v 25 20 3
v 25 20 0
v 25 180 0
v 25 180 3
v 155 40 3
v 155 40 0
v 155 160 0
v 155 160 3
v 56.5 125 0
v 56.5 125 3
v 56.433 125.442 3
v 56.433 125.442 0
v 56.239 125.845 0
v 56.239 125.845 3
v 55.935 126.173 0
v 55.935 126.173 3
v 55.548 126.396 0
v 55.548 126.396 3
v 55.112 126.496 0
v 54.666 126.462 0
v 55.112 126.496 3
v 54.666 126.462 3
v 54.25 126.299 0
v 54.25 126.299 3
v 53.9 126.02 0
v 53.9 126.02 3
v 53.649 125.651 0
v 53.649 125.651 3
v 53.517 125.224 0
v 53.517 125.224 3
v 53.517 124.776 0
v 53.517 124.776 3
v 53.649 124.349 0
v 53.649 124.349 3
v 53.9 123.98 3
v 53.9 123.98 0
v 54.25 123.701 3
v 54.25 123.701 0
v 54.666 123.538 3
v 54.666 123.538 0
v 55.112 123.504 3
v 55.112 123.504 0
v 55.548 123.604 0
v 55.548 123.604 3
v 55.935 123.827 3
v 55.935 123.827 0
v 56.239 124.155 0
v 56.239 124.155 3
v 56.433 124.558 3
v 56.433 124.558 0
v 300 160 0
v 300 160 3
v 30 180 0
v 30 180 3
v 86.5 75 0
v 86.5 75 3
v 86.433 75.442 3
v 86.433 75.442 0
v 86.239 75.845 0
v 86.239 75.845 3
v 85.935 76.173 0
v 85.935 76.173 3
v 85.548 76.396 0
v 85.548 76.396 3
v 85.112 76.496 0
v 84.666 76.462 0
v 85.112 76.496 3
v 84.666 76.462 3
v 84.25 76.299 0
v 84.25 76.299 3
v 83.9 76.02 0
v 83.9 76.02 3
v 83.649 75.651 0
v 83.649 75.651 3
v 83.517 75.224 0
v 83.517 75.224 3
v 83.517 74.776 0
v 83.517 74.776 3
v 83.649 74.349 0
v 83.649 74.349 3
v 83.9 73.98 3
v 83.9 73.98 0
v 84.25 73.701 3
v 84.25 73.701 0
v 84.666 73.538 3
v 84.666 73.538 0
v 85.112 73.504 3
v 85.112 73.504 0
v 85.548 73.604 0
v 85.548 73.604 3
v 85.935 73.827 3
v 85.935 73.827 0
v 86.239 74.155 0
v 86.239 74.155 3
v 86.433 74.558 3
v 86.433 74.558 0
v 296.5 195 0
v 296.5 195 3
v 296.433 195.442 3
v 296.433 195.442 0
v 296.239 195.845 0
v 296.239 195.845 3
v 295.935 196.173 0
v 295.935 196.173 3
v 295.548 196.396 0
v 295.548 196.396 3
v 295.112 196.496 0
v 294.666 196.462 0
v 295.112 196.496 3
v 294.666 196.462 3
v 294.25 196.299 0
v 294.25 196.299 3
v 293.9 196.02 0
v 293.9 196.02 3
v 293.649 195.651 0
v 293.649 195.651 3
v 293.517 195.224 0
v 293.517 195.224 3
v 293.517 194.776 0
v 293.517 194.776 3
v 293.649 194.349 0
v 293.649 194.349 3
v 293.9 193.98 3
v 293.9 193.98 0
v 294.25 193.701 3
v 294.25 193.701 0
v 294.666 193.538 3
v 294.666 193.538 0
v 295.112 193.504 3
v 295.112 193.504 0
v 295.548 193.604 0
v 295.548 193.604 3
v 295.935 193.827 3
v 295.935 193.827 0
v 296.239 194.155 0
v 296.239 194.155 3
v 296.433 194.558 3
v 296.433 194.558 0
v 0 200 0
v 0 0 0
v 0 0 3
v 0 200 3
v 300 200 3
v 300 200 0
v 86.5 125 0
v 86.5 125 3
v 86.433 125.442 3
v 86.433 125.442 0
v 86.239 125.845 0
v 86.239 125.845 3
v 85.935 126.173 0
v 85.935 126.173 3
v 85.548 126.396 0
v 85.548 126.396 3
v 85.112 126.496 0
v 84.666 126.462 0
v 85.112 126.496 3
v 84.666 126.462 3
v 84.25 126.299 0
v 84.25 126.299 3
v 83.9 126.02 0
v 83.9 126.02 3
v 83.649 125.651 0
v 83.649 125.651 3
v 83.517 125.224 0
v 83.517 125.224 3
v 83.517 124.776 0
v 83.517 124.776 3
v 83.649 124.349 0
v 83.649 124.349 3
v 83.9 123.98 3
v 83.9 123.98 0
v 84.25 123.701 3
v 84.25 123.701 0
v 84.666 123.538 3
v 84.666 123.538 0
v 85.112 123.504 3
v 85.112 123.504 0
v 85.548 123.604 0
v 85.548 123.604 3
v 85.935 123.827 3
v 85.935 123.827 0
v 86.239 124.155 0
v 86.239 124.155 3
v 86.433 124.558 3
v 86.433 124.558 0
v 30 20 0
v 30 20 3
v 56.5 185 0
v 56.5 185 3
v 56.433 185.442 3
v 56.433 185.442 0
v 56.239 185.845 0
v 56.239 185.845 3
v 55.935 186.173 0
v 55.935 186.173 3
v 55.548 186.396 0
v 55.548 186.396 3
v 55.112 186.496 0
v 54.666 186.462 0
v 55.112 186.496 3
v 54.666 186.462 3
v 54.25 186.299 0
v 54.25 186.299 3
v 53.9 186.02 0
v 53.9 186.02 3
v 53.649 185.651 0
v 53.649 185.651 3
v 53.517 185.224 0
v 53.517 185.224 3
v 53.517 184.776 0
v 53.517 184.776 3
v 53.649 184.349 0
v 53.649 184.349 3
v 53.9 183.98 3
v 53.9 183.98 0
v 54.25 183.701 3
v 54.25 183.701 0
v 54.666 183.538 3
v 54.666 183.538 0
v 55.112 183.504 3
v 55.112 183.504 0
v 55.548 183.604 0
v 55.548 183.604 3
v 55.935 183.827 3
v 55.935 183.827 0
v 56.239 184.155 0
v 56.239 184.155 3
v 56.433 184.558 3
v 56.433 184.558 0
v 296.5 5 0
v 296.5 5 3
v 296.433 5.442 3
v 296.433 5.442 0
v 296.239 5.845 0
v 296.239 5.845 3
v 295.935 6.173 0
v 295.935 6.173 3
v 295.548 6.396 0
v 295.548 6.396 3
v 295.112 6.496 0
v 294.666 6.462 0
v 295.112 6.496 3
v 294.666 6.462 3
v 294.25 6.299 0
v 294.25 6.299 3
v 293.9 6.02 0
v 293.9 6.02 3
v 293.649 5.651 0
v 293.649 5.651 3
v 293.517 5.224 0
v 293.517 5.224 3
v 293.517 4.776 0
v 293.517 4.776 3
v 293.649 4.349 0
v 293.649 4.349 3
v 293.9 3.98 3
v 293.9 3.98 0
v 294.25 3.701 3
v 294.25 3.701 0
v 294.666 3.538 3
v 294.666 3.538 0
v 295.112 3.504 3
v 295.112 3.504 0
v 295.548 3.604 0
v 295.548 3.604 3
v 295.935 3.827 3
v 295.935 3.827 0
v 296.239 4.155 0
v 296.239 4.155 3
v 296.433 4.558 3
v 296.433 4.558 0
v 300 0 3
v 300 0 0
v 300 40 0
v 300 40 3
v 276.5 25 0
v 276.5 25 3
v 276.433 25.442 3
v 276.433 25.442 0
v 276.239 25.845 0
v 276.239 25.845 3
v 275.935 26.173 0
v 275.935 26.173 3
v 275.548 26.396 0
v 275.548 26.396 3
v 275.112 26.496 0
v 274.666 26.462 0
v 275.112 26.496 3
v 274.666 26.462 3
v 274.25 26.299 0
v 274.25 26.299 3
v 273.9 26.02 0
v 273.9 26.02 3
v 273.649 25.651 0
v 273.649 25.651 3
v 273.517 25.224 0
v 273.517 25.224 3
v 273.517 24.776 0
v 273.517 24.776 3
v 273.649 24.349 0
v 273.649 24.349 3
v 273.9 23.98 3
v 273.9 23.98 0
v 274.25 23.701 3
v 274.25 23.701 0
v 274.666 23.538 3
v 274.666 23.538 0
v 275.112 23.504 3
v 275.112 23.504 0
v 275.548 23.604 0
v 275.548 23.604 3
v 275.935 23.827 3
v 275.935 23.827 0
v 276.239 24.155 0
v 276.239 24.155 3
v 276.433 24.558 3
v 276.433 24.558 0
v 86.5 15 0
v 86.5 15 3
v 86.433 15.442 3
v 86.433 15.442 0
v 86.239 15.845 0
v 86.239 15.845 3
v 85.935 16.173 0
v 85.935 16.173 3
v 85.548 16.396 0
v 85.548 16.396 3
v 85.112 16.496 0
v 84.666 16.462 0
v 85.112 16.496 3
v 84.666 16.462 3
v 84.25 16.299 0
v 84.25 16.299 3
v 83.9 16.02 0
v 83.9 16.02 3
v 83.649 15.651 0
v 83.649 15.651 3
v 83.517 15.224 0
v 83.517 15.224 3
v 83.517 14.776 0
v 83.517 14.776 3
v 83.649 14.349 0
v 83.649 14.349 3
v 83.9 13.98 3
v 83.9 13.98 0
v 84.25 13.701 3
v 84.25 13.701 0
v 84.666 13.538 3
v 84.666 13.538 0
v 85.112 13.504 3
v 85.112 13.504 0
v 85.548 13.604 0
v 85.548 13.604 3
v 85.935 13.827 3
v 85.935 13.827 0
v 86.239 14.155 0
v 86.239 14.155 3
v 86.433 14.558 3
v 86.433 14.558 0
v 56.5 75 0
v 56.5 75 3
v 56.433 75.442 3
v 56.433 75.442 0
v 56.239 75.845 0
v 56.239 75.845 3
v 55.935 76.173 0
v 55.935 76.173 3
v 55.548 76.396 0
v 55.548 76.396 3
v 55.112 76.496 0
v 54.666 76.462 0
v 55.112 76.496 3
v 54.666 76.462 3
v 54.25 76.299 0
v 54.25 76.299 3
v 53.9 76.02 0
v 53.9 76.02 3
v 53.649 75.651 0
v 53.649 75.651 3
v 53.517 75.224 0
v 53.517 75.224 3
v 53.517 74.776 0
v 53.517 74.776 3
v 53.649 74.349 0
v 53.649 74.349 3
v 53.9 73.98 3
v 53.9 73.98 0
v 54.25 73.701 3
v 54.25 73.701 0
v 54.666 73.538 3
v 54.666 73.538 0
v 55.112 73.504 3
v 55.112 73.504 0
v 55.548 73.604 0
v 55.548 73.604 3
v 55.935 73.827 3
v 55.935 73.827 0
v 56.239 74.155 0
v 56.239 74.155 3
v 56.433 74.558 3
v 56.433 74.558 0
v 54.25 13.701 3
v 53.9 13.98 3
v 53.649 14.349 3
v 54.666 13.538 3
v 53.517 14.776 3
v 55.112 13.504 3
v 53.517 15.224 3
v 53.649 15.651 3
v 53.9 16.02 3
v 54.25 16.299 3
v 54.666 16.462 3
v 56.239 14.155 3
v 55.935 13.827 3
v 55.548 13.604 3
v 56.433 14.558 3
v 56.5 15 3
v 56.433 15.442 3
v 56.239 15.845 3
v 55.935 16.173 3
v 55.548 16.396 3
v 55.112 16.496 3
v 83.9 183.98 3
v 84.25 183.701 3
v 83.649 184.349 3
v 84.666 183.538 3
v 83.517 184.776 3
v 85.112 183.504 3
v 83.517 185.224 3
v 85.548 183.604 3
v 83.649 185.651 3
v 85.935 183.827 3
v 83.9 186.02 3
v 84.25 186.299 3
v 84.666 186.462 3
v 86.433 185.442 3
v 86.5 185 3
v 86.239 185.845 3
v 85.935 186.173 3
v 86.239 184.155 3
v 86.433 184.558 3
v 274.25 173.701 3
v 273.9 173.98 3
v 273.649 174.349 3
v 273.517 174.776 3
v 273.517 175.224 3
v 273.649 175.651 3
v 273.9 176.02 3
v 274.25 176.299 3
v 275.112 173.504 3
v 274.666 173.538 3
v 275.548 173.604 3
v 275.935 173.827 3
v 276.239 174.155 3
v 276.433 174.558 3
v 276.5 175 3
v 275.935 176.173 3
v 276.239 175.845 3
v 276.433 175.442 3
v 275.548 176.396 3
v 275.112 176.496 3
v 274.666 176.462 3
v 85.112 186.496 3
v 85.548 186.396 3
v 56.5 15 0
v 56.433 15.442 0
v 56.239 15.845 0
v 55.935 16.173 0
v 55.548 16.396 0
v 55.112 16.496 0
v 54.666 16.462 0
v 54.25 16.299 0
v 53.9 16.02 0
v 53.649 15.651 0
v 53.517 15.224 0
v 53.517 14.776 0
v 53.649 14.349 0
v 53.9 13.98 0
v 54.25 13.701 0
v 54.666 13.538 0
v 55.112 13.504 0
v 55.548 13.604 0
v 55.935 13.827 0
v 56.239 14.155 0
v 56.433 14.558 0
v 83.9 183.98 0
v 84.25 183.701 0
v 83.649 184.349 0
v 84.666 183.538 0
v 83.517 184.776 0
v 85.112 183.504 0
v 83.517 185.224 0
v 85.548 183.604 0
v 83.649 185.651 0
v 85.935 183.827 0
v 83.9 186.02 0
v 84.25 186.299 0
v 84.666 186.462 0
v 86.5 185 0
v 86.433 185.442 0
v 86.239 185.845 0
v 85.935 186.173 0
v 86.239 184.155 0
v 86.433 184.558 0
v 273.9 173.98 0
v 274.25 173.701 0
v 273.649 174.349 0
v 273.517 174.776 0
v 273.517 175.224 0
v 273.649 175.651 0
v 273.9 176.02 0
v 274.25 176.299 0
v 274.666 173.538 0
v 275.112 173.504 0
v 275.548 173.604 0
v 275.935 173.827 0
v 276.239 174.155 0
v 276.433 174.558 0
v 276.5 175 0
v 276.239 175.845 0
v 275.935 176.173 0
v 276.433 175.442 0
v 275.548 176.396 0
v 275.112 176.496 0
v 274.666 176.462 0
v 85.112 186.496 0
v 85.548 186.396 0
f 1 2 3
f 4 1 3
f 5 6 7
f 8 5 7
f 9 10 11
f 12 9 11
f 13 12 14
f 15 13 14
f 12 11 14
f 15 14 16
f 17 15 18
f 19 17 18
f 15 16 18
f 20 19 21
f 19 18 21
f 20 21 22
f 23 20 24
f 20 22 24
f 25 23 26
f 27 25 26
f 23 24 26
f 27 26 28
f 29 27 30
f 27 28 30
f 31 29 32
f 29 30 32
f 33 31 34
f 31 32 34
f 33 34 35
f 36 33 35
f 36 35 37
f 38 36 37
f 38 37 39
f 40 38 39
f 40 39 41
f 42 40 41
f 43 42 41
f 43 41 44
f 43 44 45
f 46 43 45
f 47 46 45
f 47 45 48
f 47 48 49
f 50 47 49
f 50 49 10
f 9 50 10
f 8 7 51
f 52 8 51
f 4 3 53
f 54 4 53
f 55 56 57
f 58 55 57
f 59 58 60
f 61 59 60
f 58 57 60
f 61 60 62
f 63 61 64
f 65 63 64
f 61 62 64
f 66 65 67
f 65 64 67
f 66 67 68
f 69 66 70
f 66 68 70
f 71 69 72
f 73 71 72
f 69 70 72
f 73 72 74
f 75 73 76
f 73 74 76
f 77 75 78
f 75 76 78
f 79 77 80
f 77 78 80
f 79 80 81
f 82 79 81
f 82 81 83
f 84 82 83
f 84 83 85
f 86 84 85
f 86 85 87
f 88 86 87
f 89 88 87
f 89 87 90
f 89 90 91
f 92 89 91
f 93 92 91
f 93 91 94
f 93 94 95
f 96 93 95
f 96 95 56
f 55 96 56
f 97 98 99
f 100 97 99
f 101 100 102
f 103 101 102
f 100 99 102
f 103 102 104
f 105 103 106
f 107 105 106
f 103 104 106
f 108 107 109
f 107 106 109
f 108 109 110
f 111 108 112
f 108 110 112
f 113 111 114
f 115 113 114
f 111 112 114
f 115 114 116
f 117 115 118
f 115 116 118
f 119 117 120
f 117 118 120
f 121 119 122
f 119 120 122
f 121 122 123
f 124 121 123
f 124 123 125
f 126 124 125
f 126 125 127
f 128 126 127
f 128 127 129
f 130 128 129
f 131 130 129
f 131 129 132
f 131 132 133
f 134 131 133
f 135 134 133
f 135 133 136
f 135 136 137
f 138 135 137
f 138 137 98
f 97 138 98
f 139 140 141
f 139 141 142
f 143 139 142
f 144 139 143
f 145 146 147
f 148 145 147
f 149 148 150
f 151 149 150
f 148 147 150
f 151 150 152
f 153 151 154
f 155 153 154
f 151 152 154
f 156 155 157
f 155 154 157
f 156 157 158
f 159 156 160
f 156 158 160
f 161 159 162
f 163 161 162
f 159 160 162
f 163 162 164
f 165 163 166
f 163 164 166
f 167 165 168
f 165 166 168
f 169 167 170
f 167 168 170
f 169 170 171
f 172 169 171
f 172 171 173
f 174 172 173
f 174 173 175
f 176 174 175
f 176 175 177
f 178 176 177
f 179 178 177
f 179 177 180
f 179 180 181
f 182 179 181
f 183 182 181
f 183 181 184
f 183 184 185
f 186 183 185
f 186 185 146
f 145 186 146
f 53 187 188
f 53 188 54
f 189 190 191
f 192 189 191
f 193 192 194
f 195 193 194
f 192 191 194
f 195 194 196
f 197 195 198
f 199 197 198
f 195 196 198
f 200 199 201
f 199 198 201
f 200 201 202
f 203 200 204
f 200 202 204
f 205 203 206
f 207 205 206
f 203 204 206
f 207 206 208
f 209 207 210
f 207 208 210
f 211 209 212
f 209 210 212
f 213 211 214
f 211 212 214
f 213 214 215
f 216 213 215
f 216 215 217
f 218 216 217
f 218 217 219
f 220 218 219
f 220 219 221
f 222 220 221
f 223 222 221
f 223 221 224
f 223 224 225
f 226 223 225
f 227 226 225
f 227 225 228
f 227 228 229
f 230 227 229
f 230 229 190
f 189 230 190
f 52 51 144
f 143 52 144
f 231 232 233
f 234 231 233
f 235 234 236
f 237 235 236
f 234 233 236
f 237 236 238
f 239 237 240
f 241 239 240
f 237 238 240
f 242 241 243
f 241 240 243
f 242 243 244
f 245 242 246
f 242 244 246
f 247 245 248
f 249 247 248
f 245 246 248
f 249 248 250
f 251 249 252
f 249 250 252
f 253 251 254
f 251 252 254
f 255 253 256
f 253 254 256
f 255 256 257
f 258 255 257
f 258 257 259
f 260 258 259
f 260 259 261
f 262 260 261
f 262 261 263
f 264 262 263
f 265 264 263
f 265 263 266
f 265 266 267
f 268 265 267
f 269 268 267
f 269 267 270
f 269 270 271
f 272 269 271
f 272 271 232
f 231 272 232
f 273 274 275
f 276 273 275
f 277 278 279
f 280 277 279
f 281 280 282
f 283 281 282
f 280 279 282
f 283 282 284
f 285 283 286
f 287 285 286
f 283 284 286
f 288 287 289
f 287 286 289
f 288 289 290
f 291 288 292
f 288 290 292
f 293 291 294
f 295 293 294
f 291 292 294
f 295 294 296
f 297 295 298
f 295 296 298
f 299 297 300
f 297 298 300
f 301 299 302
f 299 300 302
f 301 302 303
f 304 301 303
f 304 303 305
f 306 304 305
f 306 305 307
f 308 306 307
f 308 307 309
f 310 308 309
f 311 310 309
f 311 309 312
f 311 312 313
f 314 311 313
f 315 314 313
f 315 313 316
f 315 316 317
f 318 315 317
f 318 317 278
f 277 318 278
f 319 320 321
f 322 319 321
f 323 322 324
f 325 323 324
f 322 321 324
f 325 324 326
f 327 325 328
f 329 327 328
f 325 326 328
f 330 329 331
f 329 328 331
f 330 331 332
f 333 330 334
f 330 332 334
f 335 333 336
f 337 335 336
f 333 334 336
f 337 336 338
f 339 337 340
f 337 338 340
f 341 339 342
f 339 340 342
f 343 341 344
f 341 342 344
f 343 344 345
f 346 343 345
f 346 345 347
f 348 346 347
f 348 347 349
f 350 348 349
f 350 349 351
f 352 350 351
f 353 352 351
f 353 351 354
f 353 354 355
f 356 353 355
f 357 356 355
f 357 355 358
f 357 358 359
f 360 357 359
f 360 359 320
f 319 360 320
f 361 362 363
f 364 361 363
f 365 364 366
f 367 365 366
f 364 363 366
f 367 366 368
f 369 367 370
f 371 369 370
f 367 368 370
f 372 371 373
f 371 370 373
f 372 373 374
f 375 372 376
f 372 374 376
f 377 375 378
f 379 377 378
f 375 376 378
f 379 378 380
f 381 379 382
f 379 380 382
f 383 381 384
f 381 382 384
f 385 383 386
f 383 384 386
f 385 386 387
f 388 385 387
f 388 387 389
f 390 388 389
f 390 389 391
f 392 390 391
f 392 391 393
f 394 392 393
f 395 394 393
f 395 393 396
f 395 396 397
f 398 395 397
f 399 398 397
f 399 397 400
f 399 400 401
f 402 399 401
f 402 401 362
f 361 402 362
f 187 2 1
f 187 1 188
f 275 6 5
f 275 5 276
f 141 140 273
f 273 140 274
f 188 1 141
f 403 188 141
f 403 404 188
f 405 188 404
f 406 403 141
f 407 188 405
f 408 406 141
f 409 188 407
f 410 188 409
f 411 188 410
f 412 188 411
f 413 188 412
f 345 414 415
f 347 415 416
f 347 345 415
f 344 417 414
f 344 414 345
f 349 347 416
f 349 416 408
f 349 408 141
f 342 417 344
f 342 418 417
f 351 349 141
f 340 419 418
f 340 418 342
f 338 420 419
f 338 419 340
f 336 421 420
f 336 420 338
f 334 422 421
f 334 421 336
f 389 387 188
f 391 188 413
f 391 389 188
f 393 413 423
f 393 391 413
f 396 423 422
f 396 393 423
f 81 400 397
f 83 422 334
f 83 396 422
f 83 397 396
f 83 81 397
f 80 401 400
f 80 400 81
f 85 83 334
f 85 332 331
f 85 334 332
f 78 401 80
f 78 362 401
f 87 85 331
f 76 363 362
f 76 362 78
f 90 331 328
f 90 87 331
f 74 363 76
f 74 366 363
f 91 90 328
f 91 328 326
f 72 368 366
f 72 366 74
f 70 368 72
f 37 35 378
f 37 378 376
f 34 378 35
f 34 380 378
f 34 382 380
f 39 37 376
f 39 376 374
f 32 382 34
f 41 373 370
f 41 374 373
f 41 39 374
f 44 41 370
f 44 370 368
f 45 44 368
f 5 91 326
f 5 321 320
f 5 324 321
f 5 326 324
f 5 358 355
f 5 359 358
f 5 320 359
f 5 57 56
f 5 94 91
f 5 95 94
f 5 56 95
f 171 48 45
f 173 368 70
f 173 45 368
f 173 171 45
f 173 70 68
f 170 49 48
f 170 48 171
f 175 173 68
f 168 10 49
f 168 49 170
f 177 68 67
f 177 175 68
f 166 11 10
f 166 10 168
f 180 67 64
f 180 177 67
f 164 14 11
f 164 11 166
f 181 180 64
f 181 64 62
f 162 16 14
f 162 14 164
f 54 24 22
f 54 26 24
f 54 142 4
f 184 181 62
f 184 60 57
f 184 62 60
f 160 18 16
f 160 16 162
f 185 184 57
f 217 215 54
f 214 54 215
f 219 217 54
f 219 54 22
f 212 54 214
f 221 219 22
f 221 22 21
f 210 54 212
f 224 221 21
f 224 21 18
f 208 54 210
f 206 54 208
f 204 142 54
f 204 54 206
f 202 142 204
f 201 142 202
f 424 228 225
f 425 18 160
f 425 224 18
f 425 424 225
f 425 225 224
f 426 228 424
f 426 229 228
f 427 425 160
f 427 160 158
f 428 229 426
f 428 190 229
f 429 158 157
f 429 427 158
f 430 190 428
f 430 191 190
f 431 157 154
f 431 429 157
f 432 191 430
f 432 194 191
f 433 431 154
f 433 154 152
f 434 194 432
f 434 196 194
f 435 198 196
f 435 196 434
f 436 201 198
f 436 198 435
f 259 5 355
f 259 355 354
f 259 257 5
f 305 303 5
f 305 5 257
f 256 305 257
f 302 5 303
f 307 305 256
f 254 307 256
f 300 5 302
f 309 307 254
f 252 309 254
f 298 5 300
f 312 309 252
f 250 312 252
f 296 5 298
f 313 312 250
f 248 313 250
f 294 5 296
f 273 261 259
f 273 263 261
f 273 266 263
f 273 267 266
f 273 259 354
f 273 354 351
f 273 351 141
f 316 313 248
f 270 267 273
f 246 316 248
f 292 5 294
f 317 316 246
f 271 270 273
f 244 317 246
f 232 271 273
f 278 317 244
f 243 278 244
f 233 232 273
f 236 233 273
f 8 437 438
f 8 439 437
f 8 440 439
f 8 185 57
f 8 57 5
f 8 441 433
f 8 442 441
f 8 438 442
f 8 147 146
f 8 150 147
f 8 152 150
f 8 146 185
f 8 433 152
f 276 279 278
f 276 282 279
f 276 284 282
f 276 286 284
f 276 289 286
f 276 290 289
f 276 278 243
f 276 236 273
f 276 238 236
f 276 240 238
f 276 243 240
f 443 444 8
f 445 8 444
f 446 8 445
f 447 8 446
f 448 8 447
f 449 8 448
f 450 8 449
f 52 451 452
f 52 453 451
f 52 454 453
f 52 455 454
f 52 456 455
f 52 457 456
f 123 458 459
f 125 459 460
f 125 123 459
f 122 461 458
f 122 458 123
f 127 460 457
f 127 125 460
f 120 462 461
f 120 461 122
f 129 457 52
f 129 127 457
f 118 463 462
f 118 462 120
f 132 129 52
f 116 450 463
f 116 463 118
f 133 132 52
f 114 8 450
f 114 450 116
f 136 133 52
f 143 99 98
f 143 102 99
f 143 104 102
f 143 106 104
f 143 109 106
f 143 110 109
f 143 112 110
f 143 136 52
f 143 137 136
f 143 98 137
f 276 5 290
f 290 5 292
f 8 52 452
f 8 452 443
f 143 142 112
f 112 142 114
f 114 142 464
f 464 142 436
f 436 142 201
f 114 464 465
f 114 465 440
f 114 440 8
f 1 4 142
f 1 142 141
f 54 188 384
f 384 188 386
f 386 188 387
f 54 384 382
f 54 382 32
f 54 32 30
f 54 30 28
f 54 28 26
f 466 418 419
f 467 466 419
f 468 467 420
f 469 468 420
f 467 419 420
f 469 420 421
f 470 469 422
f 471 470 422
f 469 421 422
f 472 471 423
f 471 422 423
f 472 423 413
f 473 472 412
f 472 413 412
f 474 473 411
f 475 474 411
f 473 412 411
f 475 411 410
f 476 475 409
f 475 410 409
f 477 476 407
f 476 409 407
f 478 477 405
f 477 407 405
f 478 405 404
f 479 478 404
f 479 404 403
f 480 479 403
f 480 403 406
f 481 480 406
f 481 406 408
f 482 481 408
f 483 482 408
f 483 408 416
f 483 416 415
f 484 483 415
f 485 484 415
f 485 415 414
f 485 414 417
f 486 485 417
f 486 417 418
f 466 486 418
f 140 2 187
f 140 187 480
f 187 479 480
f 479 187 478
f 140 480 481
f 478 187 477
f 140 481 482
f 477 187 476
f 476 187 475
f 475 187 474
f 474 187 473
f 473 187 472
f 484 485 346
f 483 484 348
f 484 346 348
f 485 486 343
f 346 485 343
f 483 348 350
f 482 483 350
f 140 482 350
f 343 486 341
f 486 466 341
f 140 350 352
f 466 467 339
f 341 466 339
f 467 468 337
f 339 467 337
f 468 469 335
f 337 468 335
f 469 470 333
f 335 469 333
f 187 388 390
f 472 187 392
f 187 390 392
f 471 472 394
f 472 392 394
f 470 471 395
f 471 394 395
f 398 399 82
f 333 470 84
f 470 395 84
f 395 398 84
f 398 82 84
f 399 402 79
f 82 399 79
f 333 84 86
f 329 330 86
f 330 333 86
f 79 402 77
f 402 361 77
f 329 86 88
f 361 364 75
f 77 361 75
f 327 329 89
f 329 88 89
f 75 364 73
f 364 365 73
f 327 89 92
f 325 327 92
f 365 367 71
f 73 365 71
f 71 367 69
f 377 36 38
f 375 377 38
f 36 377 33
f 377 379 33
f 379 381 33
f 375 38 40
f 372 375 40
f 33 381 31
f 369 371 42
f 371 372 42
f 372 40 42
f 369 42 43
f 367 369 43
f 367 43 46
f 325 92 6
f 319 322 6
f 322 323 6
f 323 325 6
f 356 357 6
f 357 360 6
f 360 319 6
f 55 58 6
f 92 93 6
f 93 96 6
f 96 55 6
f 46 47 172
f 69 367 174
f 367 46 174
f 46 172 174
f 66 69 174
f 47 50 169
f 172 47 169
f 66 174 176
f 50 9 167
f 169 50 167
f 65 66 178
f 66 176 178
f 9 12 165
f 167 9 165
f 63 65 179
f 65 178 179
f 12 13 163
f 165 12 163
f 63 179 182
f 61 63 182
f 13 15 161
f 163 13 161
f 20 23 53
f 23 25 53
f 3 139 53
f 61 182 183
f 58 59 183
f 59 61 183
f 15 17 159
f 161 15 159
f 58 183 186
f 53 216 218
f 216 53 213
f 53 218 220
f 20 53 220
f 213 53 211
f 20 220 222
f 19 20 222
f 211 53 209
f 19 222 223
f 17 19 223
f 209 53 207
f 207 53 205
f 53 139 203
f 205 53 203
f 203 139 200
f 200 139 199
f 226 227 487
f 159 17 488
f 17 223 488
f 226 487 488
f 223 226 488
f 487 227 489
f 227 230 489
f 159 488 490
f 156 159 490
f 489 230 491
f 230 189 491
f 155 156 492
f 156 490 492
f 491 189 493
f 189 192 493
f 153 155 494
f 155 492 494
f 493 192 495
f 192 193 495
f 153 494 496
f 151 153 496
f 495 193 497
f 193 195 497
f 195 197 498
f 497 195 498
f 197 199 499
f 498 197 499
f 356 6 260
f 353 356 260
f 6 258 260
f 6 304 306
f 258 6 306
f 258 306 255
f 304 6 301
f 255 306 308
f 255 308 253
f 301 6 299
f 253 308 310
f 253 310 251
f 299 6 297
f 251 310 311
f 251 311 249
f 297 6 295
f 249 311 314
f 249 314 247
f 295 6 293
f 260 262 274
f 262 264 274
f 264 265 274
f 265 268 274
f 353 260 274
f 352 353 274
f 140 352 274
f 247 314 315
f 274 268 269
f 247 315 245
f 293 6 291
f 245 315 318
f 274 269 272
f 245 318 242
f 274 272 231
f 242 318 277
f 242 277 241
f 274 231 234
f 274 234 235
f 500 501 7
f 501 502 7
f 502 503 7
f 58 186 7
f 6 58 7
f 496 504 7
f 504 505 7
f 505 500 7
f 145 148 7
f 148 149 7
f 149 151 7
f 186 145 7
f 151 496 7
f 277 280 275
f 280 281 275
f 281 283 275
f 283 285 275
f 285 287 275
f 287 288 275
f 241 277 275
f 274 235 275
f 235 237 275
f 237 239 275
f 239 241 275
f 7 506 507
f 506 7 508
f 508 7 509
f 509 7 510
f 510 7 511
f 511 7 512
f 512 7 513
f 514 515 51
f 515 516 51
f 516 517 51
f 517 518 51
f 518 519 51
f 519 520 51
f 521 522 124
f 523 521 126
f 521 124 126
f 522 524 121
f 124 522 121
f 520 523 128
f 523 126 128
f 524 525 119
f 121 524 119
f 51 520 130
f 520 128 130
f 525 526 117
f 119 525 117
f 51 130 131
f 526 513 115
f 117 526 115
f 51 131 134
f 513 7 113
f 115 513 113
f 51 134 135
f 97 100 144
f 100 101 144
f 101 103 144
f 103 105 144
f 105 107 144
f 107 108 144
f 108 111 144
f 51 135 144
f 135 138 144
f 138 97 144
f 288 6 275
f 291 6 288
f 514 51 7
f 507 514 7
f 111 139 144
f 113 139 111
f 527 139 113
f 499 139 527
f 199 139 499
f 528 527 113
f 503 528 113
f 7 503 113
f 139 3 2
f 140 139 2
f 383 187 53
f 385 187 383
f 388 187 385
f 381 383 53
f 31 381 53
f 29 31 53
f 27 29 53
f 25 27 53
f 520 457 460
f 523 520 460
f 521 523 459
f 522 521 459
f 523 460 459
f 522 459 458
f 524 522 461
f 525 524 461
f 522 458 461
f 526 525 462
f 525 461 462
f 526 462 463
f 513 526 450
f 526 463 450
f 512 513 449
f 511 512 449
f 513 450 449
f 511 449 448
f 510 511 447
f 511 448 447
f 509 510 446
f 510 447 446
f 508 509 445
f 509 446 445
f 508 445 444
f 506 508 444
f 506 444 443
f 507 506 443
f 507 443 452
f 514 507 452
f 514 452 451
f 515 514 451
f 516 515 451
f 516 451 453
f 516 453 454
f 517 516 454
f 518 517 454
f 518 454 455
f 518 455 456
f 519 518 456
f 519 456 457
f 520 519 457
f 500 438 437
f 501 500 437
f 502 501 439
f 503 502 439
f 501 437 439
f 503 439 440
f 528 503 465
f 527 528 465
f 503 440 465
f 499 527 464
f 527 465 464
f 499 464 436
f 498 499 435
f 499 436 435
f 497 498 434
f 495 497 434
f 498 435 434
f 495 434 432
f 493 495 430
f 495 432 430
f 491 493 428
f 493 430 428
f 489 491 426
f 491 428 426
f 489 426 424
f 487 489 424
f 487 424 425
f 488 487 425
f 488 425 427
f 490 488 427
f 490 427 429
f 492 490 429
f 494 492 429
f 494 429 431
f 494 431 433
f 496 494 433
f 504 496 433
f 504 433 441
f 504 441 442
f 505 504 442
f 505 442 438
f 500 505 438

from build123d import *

# Parameters (mm, degrees)
SKETCH1_W             = 300
SKETCH1_H             = 200
BOSS_EXTRUDE1_DEPTH   = 3
SKETCH2_W             = 145
SKETCH2_H             = 120
CUT_EXTRUDE1_DEPTH    = 3
SKETCH3_W             = 5
SKETCH3_H             = 160
CUT_EXTRUDE2_DEPTH    = 3
F_3_0MM_DOWEL_HOLE1_D = 3


with BuildPart() as part:
    # Sketch1 → Boss-Extrude1 (new body)
    with BuildSketch(Plane.XY):
        with Locations((150, 100)):
            Rectangle(SKETCH1_W, SKETCH1_H)
    extrude(amount=BOSS_EXTRUDE1_DEPTH)

    # Sketch2 → Cut-Extrude1 (cut)
    with BuildSketch(Plane.XY):
        with Locations((227.5, 100)):
            Rectangle(SKETCH2_W, SKETCH2_H)
    extrude(amount=CUT_EXTRUDE1_DEPTH, mode=Mode.SUBTRACT)

    # Sketch3 → Cut-Extrude2 (cut)
    with BuildSketch(Plane.XY):
        with Locations((27.5, 100)):
            Rectangle(SKETCH3_W, SKETCH3_H)
    extrude(amount=CUT_EXTRUDE2_DEPTH, mode=Mode.SUBTRACT)

    # Ø3.0mm Dowel Hole1 (through all)
    with Locations(Plane(origin=(0, 0, 0), x_dir=(-1, 0, 0), z_dir=(0, 0, -1))):
        with Locations((-85, 75), (-55, 75), (-55, 15), (-85, 15), (-295, 5), (-275, 25), (-85, 185), (-55, 185), (-55, 125), (-85, 125), (-275, 175), (-295, 195)):
            Hole(F_3_0MM_DOWEL_HOLE1_D / 2)


solid = part.part
